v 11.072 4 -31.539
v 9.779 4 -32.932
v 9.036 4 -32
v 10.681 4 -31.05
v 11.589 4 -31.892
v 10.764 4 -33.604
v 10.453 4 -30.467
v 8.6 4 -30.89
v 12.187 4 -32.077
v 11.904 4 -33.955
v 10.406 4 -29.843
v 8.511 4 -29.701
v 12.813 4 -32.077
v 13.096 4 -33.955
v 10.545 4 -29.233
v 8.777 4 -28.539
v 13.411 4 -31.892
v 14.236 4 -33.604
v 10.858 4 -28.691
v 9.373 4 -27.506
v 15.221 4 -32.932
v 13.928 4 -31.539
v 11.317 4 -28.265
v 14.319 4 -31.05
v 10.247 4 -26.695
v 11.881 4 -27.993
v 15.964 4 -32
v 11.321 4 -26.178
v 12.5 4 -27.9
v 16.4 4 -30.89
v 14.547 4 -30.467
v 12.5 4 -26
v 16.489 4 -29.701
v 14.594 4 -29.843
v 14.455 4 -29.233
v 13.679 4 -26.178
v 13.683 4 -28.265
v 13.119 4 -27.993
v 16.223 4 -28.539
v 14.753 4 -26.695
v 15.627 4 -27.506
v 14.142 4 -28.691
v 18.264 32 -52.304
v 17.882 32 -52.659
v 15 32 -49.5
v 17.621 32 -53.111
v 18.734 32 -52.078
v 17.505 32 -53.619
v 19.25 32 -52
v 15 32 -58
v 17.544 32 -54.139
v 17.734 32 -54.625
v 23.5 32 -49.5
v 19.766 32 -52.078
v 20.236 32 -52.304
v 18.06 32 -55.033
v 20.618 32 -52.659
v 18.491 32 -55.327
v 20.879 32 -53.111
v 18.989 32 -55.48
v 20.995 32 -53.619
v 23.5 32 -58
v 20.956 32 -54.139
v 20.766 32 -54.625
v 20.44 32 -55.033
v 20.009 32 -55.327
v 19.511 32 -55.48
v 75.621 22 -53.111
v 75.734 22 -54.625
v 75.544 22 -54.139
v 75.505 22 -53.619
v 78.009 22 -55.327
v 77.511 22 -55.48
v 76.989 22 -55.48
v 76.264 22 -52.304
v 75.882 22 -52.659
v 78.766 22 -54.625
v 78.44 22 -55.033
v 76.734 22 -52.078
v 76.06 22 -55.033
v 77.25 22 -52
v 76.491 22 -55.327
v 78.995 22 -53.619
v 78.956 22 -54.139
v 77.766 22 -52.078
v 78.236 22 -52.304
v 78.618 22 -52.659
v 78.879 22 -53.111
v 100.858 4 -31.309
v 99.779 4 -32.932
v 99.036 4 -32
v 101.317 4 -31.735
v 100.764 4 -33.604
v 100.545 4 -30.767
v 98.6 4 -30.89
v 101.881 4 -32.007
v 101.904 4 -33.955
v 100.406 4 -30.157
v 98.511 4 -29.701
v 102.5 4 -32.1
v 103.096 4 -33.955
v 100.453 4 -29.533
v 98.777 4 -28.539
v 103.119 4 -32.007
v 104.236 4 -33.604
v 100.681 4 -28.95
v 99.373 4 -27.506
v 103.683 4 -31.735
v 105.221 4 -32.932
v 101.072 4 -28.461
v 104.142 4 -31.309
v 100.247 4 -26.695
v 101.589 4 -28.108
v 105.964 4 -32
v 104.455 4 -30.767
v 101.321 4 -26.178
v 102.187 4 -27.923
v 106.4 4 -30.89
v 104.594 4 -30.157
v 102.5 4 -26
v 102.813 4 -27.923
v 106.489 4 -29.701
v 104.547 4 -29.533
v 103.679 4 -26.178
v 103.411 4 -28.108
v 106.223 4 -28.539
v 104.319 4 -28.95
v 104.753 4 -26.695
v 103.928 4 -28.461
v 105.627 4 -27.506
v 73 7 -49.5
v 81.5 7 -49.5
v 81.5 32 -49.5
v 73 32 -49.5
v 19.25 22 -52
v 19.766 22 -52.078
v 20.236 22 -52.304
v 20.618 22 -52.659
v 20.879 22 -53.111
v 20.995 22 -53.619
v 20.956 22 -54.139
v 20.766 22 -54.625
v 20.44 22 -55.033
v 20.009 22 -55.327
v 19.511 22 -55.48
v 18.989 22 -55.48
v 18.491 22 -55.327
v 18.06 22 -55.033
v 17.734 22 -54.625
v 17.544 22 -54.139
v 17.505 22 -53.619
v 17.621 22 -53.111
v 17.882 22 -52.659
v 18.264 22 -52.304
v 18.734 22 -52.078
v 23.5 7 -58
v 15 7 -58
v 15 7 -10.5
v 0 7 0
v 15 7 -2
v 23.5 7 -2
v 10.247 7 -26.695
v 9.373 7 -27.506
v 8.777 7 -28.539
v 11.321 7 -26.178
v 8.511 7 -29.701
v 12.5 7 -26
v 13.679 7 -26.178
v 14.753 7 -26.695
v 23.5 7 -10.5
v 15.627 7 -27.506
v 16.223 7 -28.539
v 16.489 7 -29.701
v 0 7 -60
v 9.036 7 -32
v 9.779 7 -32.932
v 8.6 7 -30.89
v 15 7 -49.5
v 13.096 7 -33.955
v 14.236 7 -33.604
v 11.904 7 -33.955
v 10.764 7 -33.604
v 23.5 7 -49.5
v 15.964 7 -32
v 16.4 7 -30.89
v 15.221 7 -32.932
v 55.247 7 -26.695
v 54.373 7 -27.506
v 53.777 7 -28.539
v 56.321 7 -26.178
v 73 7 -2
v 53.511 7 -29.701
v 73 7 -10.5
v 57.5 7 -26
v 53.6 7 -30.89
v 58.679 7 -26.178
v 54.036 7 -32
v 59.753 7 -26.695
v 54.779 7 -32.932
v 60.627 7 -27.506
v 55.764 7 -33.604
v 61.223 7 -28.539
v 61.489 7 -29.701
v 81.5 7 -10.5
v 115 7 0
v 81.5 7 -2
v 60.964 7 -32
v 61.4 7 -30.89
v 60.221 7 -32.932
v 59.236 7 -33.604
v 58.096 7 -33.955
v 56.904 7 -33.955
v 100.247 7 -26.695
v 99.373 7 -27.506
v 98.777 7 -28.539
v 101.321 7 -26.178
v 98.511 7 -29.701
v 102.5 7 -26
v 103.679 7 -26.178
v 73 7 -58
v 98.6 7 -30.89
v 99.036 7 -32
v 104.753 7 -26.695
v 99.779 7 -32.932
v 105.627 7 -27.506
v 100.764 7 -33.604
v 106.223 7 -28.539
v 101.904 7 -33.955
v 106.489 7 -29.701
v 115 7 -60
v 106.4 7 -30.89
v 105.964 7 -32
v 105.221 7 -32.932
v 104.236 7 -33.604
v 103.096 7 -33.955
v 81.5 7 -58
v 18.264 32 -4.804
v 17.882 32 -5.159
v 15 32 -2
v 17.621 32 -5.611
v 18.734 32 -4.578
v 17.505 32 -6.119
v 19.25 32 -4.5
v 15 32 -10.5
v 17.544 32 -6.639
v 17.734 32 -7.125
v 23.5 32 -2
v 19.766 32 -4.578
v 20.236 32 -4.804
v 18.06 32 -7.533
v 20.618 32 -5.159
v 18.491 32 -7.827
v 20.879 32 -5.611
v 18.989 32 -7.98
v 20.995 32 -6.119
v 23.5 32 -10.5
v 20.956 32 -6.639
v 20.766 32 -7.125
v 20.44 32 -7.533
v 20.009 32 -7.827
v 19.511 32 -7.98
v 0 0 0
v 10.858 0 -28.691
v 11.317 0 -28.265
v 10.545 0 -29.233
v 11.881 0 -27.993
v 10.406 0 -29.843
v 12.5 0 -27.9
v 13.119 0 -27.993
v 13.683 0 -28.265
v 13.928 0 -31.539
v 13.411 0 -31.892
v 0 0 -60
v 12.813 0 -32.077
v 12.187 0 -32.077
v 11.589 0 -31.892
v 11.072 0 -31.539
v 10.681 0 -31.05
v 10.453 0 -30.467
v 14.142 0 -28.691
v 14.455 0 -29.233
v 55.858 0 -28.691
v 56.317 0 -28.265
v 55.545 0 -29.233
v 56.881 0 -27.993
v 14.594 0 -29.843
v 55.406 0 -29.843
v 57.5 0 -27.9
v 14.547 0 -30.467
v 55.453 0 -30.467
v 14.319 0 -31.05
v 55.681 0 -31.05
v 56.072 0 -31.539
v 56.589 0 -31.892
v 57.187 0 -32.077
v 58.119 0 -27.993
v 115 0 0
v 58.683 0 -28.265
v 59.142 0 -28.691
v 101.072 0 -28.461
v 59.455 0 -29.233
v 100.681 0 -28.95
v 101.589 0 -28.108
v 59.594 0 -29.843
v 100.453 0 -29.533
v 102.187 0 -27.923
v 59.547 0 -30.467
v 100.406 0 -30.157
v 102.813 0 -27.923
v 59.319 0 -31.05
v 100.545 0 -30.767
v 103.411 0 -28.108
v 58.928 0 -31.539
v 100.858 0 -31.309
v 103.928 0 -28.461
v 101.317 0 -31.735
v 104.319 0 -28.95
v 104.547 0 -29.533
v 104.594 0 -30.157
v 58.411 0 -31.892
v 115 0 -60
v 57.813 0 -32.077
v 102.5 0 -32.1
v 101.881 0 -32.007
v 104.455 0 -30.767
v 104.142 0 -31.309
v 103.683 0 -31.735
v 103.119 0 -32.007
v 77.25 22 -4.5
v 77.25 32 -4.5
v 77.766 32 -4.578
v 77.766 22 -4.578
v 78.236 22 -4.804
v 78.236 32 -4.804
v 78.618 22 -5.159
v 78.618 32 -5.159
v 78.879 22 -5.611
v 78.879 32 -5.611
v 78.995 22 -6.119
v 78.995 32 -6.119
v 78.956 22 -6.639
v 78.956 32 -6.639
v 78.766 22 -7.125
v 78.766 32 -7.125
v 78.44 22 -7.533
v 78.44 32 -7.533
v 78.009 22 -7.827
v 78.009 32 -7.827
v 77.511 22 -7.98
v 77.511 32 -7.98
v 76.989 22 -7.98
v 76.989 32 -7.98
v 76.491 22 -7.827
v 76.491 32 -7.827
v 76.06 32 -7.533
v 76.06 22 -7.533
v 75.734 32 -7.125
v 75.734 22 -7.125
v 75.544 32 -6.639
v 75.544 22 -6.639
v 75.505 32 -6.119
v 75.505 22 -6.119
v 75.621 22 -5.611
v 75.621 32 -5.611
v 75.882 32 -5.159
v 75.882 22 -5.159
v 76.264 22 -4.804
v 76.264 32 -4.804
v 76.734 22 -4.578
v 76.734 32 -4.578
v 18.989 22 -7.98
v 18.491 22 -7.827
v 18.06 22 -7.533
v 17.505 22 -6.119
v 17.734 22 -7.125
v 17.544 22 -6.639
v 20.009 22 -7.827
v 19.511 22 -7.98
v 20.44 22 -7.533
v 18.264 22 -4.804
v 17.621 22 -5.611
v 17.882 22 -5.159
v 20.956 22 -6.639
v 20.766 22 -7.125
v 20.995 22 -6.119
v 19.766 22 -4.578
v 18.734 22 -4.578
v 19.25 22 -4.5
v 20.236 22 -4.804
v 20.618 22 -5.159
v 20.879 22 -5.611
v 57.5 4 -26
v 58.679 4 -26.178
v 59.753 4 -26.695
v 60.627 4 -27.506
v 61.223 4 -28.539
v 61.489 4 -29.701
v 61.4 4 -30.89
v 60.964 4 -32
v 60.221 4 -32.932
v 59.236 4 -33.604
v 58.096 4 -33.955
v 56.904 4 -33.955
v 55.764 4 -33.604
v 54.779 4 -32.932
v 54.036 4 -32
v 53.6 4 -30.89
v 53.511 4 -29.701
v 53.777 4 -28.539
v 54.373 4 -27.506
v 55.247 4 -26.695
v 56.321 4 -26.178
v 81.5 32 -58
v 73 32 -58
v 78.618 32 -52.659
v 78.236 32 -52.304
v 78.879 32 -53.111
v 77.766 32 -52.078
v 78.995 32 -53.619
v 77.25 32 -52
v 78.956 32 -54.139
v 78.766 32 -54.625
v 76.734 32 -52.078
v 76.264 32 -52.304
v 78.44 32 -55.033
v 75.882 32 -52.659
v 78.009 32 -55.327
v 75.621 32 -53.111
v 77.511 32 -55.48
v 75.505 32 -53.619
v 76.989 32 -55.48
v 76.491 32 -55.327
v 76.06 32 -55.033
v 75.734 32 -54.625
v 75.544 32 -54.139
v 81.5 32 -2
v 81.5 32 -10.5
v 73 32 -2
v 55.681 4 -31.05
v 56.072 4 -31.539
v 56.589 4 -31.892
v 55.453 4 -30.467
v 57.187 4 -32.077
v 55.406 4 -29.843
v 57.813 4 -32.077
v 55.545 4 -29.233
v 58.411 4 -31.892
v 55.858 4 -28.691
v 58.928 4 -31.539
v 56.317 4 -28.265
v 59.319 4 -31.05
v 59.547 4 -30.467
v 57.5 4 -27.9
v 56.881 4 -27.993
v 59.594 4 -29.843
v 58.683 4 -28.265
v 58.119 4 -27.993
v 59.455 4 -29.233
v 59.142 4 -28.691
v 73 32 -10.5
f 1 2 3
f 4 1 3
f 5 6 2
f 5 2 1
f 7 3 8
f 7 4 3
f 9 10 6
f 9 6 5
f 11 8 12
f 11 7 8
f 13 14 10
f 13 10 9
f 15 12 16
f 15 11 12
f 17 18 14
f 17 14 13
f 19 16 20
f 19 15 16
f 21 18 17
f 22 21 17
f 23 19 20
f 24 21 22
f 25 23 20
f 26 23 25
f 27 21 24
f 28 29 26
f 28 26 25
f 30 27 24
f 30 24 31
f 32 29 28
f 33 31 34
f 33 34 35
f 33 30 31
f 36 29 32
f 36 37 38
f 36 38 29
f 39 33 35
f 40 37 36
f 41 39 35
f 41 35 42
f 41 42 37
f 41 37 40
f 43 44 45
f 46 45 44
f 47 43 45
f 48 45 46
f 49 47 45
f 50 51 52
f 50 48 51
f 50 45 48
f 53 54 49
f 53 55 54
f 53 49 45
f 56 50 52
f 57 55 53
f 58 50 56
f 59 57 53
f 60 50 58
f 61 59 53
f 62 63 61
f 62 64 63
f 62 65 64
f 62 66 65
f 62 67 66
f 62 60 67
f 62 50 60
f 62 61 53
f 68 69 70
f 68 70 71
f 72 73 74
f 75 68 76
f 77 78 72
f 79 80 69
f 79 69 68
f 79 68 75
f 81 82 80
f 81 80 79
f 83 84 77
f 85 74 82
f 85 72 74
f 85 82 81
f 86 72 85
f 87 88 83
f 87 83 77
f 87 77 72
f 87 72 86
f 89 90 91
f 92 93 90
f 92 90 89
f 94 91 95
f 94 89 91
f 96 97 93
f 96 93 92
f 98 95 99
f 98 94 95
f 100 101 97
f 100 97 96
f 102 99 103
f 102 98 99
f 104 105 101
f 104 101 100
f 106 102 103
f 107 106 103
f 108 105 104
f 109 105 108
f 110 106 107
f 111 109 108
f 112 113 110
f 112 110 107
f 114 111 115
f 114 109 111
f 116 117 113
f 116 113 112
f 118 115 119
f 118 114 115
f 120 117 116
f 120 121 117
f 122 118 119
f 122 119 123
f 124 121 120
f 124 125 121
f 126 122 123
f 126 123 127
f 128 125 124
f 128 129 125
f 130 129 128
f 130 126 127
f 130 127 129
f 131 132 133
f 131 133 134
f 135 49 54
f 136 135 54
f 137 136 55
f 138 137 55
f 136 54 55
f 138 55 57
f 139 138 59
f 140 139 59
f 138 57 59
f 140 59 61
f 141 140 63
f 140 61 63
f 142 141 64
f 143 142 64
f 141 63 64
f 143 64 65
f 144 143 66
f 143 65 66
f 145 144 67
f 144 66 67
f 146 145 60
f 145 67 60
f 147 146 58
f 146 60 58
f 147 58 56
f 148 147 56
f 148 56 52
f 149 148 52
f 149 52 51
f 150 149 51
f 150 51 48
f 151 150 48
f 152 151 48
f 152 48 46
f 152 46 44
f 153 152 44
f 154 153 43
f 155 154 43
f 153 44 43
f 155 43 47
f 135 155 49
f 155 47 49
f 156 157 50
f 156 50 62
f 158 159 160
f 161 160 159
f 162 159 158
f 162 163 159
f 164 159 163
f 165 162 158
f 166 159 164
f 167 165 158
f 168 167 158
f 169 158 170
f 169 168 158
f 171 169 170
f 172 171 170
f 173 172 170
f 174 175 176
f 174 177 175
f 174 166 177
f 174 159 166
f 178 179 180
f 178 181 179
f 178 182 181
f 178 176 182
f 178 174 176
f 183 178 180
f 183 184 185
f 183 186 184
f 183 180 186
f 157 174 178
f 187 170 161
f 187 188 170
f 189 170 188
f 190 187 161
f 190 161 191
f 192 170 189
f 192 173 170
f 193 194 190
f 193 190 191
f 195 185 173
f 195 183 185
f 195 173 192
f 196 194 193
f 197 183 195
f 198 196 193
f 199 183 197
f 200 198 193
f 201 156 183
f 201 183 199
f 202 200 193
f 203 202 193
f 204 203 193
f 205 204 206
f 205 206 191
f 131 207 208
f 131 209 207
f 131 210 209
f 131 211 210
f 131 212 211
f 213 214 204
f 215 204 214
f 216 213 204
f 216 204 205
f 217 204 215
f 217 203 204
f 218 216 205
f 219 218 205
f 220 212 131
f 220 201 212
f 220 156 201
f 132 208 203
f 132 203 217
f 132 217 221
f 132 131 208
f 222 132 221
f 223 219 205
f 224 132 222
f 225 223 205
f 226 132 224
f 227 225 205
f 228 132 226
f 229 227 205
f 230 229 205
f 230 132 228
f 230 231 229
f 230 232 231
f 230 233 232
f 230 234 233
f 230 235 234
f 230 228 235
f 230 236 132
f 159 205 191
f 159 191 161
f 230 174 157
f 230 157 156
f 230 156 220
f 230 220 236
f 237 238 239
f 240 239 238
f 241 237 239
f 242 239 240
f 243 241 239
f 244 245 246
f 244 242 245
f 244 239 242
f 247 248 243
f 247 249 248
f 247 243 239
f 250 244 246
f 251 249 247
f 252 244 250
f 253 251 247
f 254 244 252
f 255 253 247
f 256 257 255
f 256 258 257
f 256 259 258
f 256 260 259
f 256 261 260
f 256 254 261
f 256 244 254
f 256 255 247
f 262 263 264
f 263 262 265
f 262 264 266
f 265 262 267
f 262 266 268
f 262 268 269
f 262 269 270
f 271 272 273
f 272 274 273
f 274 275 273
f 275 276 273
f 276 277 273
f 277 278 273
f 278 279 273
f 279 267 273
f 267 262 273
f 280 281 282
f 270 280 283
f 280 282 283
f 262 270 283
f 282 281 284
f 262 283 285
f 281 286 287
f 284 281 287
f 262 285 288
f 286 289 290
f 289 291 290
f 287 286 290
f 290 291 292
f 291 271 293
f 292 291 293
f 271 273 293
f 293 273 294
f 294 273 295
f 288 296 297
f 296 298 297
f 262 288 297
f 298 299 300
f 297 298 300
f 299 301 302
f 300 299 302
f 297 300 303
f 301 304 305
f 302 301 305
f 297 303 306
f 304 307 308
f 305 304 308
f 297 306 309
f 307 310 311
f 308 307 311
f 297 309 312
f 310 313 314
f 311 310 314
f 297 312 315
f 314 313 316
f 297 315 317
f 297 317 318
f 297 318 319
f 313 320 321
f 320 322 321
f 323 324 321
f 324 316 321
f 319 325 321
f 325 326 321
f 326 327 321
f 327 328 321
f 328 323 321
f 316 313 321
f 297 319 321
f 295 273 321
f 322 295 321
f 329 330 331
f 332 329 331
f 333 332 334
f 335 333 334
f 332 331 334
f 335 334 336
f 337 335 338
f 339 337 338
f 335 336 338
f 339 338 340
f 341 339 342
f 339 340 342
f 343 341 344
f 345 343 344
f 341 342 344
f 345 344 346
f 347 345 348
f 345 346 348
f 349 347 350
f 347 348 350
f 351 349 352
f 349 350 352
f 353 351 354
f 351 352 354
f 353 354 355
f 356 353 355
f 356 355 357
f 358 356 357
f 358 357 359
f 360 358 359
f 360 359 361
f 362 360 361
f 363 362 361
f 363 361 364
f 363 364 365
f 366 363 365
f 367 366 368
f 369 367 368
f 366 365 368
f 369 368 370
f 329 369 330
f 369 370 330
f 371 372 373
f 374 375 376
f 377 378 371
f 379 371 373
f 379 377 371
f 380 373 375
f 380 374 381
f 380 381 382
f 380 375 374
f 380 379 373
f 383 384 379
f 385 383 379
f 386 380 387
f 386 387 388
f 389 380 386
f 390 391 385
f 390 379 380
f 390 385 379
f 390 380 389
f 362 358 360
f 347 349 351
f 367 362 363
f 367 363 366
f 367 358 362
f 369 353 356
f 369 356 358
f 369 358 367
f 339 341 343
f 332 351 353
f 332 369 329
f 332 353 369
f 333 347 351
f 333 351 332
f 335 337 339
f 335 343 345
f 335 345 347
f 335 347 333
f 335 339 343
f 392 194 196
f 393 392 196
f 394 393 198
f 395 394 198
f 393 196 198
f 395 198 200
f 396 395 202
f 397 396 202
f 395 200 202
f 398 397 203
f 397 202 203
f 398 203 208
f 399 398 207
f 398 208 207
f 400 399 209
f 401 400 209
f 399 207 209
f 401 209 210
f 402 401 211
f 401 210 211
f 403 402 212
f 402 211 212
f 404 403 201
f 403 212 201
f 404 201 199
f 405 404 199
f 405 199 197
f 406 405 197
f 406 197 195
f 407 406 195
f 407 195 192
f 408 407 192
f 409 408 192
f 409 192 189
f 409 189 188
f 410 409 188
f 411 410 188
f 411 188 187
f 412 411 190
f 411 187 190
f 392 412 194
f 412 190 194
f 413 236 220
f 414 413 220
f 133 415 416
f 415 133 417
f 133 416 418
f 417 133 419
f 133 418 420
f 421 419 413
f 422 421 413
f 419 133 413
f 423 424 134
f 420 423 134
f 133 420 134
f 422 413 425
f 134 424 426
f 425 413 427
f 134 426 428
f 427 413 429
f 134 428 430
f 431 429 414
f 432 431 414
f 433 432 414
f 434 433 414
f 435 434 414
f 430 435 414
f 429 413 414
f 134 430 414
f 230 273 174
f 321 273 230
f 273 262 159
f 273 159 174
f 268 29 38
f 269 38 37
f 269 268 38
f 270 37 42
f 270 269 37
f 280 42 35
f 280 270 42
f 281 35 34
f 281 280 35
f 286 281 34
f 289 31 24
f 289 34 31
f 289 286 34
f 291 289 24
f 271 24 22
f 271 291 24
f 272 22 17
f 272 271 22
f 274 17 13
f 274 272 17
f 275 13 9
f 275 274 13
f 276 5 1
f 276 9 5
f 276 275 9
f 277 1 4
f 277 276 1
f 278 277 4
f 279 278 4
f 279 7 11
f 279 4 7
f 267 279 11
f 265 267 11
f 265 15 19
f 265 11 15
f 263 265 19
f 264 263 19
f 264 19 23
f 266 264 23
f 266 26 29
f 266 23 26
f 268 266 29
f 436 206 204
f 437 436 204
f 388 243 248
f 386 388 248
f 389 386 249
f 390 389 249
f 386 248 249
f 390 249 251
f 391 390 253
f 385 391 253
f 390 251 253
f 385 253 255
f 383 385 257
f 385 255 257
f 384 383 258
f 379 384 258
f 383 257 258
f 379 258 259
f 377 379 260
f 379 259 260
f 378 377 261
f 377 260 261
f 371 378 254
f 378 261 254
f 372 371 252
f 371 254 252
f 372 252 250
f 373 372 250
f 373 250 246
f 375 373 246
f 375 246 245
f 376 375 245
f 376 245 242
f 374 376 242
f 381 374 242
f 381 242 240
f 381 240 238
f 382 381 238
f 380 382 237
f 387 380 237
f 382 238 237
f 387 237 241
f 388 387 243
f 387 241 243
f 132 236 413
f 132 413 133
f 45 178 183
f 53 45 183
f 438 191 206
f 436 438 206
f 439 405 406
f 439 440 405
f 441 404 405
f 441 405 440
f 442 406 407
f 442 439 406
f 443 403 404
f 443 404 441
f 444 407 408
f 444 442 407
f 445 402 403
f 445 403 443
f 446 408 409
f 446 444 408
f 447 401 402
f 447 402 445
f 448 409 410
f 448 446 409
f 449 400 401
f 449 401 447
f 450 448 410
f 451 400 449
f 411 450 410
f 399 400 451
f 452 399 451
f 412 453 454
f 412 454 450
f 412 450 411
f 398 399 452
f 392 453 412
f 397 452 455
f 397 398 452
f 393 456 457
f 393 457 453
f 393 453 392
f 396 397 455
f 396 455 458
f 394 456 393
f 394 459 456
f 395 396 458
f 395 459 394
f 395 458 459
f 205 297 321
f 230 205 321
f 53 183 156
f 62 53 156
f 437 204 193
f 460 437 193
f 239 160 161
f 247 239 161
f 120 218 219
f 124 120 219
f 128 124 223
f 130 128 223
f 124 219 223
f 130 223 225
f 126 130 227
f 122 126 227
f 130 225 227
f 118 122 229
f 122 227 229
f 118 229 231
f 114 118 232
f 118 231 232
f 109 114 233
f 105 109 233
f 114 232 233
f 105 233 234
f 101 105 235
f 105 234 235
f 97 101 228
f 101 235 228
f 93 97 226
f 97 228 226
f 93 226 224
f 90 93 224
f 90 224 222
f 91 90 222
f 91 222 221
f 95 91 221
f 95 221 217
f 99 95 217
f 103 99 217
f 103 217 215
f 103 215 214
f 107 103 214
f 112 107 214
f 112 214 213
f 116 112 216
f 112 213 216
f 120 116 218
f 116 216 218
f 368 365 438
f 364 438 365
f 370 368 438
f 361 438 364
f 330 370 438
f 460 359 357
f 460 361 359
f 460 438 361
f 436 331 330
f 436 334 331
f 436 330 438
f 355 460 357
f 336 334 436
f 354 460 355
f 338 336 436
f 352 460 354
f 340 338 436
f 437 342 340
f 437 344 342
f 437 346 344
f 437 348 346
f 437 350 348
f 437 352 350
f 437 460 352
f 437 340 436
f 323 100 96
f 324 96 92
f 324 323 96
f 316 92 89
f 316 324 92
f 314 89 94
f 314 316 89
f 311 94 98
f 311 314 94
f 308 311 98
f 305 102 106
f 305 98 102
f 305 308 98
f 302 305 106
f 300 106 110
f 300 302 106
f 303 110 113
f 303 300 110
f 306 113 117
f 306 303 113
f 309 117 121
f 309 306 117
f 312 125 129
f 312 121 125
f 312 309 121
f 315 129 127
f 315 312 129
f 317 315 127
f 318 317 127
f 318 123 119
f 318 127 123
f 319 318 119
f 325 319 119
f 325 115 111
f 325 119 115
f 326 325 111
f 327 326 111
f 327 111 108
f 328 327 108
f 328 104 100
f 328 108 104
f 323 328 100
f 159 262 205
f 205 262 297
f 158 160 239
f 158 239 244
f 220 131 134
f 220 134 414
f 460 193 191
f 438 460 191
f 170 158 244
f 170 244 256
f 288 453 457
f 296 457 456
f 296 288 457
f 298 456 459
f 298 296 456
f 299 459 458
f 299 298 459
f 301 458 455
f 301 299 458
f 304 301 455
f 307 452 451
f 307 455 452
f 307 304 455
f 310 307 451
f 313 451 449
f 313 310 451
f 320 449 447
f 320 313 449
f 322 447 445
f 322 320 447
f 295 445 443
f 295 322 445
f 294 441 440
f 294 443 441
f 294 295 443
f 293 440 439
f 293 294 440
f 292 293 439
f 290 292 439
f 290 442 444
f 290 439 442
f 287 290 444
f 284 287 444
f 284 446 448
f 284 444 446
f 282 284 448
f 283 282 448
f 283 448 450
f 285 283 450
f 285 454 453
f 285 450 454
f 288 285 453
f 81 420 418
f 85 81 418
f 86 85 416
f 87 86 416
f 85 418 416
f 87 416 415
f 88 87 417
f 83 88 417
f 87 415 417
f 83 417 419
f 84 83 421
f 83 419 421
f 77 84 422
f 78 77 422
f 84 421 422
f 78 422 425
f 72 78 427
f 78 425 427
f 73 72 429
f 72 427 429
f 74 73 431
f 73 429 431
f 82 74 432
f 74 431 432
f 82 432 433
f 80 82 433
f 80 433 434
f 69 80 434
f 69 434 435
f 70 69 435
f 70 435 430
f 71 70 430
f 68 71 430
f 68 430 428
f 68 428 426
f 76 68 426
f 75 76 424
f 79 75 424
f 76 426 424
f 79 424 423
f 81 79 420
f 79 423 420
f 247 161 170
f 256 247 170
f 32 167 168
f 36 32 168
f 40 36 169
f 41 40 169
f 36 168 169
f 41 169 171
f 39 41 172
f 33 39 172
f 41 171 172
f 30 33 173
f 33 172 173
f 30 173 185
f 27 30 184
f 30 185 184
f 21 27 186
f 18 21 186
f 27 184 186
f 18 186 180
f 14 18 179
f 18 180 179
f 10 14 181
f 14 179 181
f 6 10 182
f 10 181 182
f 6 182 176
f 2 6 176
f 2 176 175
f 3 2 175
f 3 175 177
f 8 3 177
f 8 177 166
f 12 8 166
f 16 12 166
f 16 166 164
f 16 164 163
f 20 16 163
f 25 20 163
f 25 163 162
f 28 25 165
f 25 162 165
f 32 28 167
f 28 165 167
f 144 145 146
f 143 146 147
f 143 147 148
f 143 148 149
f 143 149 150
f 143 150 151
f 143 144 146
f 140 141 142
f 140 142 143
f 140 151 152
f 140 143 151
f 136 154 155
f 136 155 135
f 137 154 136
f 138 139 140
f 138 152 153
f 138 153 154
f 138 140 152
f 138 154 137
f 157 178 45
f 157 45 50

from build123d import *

# Parameters (mm, degrees)
SKETCH1_W           = 115
SKETCH1_H           = 60
SKETCH1_R           = 2.1
BOSS_EXTRUDE2_DEPTH = 7
SKETCH2_R           = 4
CUT_EXTRUDE1_DEPTH  = 3
SKETCH5_W           = 8.5
SKETCH5_H           = 8.5
BOSS_EXTRUDE3_DEPTH = 25
SKETCH6_R           = 1.75
CUT_EXTRUDE2_DEPTH  = 10


with BuildPart() as part:
    # Sketch1 → Boss-Extrude2 (new body)
    with BuildSketch(Plane(origin=(0, 0, 0), x_dir=(1, 0, 0), z_dir=(0, 1, 0))):
        with Locations((57.5, 30)):
            Rectangle(SKETCH1_W, SKETCH1_H)
        with Locations(Location((57.5, 30, 0), (0, 0, 270))):
            Circle(SKETCH1_R, mode=Mode.SUBTRACT)
        with Locations(Location((12.5, 30, 0), (0, 0, 270))):
            Circle(SKETCH1_R, mode=Mode.SUBTRACT)
        with Locations(Location((102.5, 30, 0), (0, 0, 90))):
            Circle(SKETCH1_R, mode=Mode.SUBTRACT)
    extrude(amount=BOSS_EXTRUDE2_DEPTH)

    # Sketch2 → Cut-Extrude1 (cut)
    with BuildSketch(Plane(origin=(0, 7, 0), x_dir=(1, 0, 0), z_dir=(0, 1, 0))):
        with Locations(Location((12.5, 30, 0), (0, 0, 270))):
            Circle(SKETCH2_R)
        with Locations(Location((57.5, 30, 0), (0, 0, 270))):
            Circle(SKETCH2_R)
        with Locations(Location((102.5, 30, 0), (0, 0, 270))):
            Circle(SKETCH2_R)
    extrude(amount=-CUT_EXTRUDE1_DEPTH, mode=Mode.SUBTRACT)

    # Sketch5 → Boss-Extrude3 (add)
    with BuildSketch(Plane(origin=(0, 7, 0), x_dir=(1, 0, 0), z_dir=(0, 1, 0))):
        with Locations((19.25, 53.75)):
            Rectangle(SKETCH5_W, SKETCH5_H)
        with Locations((19.25, 6.25)):
            Rectangle(SKETCH5_W, SKETCH5_H)
        Polygon((73, 58), (77.25, 58), (81.5, 58), (81.5, 49.5), (73, 49.5), align=None)
        Polygon((73, 10.5), (73, 2), (77.25, 2), (81.5, 2), (81.5, 10.5), align=None)
    extrude(amount=BOSS_EXTRUDE3_DEPTH)

    # Sketch6 → Cut-Extrude2 (cut)
    with BuildSketch(Plane(origin=(0, 32, 0), x_dir=(1, 0, 0), z_dir=(0, 1, 0))):
        with Locations(Location((19.25, 53.75, 0), (0, 0, 270))):
            Circle(SKETCH6_R)
        with Locations(Location((77.25, 53.75, 0), (0, 0, 270))):
            Circle(SKETCH6_R)
        with Locations(Location((19.25, 6.25, 0), (0, 0, 270))):
            Circle(SKETCH6_R)
        with Locations(Location((77.25, 6.25, 0), (0, 0, 270))):
            Circle(SKETCH6_R)
    extrude(amount=-CUT_EXTRUDE2_DEPTH, mode=Mode.SUBTRACT)


solid = part.part
